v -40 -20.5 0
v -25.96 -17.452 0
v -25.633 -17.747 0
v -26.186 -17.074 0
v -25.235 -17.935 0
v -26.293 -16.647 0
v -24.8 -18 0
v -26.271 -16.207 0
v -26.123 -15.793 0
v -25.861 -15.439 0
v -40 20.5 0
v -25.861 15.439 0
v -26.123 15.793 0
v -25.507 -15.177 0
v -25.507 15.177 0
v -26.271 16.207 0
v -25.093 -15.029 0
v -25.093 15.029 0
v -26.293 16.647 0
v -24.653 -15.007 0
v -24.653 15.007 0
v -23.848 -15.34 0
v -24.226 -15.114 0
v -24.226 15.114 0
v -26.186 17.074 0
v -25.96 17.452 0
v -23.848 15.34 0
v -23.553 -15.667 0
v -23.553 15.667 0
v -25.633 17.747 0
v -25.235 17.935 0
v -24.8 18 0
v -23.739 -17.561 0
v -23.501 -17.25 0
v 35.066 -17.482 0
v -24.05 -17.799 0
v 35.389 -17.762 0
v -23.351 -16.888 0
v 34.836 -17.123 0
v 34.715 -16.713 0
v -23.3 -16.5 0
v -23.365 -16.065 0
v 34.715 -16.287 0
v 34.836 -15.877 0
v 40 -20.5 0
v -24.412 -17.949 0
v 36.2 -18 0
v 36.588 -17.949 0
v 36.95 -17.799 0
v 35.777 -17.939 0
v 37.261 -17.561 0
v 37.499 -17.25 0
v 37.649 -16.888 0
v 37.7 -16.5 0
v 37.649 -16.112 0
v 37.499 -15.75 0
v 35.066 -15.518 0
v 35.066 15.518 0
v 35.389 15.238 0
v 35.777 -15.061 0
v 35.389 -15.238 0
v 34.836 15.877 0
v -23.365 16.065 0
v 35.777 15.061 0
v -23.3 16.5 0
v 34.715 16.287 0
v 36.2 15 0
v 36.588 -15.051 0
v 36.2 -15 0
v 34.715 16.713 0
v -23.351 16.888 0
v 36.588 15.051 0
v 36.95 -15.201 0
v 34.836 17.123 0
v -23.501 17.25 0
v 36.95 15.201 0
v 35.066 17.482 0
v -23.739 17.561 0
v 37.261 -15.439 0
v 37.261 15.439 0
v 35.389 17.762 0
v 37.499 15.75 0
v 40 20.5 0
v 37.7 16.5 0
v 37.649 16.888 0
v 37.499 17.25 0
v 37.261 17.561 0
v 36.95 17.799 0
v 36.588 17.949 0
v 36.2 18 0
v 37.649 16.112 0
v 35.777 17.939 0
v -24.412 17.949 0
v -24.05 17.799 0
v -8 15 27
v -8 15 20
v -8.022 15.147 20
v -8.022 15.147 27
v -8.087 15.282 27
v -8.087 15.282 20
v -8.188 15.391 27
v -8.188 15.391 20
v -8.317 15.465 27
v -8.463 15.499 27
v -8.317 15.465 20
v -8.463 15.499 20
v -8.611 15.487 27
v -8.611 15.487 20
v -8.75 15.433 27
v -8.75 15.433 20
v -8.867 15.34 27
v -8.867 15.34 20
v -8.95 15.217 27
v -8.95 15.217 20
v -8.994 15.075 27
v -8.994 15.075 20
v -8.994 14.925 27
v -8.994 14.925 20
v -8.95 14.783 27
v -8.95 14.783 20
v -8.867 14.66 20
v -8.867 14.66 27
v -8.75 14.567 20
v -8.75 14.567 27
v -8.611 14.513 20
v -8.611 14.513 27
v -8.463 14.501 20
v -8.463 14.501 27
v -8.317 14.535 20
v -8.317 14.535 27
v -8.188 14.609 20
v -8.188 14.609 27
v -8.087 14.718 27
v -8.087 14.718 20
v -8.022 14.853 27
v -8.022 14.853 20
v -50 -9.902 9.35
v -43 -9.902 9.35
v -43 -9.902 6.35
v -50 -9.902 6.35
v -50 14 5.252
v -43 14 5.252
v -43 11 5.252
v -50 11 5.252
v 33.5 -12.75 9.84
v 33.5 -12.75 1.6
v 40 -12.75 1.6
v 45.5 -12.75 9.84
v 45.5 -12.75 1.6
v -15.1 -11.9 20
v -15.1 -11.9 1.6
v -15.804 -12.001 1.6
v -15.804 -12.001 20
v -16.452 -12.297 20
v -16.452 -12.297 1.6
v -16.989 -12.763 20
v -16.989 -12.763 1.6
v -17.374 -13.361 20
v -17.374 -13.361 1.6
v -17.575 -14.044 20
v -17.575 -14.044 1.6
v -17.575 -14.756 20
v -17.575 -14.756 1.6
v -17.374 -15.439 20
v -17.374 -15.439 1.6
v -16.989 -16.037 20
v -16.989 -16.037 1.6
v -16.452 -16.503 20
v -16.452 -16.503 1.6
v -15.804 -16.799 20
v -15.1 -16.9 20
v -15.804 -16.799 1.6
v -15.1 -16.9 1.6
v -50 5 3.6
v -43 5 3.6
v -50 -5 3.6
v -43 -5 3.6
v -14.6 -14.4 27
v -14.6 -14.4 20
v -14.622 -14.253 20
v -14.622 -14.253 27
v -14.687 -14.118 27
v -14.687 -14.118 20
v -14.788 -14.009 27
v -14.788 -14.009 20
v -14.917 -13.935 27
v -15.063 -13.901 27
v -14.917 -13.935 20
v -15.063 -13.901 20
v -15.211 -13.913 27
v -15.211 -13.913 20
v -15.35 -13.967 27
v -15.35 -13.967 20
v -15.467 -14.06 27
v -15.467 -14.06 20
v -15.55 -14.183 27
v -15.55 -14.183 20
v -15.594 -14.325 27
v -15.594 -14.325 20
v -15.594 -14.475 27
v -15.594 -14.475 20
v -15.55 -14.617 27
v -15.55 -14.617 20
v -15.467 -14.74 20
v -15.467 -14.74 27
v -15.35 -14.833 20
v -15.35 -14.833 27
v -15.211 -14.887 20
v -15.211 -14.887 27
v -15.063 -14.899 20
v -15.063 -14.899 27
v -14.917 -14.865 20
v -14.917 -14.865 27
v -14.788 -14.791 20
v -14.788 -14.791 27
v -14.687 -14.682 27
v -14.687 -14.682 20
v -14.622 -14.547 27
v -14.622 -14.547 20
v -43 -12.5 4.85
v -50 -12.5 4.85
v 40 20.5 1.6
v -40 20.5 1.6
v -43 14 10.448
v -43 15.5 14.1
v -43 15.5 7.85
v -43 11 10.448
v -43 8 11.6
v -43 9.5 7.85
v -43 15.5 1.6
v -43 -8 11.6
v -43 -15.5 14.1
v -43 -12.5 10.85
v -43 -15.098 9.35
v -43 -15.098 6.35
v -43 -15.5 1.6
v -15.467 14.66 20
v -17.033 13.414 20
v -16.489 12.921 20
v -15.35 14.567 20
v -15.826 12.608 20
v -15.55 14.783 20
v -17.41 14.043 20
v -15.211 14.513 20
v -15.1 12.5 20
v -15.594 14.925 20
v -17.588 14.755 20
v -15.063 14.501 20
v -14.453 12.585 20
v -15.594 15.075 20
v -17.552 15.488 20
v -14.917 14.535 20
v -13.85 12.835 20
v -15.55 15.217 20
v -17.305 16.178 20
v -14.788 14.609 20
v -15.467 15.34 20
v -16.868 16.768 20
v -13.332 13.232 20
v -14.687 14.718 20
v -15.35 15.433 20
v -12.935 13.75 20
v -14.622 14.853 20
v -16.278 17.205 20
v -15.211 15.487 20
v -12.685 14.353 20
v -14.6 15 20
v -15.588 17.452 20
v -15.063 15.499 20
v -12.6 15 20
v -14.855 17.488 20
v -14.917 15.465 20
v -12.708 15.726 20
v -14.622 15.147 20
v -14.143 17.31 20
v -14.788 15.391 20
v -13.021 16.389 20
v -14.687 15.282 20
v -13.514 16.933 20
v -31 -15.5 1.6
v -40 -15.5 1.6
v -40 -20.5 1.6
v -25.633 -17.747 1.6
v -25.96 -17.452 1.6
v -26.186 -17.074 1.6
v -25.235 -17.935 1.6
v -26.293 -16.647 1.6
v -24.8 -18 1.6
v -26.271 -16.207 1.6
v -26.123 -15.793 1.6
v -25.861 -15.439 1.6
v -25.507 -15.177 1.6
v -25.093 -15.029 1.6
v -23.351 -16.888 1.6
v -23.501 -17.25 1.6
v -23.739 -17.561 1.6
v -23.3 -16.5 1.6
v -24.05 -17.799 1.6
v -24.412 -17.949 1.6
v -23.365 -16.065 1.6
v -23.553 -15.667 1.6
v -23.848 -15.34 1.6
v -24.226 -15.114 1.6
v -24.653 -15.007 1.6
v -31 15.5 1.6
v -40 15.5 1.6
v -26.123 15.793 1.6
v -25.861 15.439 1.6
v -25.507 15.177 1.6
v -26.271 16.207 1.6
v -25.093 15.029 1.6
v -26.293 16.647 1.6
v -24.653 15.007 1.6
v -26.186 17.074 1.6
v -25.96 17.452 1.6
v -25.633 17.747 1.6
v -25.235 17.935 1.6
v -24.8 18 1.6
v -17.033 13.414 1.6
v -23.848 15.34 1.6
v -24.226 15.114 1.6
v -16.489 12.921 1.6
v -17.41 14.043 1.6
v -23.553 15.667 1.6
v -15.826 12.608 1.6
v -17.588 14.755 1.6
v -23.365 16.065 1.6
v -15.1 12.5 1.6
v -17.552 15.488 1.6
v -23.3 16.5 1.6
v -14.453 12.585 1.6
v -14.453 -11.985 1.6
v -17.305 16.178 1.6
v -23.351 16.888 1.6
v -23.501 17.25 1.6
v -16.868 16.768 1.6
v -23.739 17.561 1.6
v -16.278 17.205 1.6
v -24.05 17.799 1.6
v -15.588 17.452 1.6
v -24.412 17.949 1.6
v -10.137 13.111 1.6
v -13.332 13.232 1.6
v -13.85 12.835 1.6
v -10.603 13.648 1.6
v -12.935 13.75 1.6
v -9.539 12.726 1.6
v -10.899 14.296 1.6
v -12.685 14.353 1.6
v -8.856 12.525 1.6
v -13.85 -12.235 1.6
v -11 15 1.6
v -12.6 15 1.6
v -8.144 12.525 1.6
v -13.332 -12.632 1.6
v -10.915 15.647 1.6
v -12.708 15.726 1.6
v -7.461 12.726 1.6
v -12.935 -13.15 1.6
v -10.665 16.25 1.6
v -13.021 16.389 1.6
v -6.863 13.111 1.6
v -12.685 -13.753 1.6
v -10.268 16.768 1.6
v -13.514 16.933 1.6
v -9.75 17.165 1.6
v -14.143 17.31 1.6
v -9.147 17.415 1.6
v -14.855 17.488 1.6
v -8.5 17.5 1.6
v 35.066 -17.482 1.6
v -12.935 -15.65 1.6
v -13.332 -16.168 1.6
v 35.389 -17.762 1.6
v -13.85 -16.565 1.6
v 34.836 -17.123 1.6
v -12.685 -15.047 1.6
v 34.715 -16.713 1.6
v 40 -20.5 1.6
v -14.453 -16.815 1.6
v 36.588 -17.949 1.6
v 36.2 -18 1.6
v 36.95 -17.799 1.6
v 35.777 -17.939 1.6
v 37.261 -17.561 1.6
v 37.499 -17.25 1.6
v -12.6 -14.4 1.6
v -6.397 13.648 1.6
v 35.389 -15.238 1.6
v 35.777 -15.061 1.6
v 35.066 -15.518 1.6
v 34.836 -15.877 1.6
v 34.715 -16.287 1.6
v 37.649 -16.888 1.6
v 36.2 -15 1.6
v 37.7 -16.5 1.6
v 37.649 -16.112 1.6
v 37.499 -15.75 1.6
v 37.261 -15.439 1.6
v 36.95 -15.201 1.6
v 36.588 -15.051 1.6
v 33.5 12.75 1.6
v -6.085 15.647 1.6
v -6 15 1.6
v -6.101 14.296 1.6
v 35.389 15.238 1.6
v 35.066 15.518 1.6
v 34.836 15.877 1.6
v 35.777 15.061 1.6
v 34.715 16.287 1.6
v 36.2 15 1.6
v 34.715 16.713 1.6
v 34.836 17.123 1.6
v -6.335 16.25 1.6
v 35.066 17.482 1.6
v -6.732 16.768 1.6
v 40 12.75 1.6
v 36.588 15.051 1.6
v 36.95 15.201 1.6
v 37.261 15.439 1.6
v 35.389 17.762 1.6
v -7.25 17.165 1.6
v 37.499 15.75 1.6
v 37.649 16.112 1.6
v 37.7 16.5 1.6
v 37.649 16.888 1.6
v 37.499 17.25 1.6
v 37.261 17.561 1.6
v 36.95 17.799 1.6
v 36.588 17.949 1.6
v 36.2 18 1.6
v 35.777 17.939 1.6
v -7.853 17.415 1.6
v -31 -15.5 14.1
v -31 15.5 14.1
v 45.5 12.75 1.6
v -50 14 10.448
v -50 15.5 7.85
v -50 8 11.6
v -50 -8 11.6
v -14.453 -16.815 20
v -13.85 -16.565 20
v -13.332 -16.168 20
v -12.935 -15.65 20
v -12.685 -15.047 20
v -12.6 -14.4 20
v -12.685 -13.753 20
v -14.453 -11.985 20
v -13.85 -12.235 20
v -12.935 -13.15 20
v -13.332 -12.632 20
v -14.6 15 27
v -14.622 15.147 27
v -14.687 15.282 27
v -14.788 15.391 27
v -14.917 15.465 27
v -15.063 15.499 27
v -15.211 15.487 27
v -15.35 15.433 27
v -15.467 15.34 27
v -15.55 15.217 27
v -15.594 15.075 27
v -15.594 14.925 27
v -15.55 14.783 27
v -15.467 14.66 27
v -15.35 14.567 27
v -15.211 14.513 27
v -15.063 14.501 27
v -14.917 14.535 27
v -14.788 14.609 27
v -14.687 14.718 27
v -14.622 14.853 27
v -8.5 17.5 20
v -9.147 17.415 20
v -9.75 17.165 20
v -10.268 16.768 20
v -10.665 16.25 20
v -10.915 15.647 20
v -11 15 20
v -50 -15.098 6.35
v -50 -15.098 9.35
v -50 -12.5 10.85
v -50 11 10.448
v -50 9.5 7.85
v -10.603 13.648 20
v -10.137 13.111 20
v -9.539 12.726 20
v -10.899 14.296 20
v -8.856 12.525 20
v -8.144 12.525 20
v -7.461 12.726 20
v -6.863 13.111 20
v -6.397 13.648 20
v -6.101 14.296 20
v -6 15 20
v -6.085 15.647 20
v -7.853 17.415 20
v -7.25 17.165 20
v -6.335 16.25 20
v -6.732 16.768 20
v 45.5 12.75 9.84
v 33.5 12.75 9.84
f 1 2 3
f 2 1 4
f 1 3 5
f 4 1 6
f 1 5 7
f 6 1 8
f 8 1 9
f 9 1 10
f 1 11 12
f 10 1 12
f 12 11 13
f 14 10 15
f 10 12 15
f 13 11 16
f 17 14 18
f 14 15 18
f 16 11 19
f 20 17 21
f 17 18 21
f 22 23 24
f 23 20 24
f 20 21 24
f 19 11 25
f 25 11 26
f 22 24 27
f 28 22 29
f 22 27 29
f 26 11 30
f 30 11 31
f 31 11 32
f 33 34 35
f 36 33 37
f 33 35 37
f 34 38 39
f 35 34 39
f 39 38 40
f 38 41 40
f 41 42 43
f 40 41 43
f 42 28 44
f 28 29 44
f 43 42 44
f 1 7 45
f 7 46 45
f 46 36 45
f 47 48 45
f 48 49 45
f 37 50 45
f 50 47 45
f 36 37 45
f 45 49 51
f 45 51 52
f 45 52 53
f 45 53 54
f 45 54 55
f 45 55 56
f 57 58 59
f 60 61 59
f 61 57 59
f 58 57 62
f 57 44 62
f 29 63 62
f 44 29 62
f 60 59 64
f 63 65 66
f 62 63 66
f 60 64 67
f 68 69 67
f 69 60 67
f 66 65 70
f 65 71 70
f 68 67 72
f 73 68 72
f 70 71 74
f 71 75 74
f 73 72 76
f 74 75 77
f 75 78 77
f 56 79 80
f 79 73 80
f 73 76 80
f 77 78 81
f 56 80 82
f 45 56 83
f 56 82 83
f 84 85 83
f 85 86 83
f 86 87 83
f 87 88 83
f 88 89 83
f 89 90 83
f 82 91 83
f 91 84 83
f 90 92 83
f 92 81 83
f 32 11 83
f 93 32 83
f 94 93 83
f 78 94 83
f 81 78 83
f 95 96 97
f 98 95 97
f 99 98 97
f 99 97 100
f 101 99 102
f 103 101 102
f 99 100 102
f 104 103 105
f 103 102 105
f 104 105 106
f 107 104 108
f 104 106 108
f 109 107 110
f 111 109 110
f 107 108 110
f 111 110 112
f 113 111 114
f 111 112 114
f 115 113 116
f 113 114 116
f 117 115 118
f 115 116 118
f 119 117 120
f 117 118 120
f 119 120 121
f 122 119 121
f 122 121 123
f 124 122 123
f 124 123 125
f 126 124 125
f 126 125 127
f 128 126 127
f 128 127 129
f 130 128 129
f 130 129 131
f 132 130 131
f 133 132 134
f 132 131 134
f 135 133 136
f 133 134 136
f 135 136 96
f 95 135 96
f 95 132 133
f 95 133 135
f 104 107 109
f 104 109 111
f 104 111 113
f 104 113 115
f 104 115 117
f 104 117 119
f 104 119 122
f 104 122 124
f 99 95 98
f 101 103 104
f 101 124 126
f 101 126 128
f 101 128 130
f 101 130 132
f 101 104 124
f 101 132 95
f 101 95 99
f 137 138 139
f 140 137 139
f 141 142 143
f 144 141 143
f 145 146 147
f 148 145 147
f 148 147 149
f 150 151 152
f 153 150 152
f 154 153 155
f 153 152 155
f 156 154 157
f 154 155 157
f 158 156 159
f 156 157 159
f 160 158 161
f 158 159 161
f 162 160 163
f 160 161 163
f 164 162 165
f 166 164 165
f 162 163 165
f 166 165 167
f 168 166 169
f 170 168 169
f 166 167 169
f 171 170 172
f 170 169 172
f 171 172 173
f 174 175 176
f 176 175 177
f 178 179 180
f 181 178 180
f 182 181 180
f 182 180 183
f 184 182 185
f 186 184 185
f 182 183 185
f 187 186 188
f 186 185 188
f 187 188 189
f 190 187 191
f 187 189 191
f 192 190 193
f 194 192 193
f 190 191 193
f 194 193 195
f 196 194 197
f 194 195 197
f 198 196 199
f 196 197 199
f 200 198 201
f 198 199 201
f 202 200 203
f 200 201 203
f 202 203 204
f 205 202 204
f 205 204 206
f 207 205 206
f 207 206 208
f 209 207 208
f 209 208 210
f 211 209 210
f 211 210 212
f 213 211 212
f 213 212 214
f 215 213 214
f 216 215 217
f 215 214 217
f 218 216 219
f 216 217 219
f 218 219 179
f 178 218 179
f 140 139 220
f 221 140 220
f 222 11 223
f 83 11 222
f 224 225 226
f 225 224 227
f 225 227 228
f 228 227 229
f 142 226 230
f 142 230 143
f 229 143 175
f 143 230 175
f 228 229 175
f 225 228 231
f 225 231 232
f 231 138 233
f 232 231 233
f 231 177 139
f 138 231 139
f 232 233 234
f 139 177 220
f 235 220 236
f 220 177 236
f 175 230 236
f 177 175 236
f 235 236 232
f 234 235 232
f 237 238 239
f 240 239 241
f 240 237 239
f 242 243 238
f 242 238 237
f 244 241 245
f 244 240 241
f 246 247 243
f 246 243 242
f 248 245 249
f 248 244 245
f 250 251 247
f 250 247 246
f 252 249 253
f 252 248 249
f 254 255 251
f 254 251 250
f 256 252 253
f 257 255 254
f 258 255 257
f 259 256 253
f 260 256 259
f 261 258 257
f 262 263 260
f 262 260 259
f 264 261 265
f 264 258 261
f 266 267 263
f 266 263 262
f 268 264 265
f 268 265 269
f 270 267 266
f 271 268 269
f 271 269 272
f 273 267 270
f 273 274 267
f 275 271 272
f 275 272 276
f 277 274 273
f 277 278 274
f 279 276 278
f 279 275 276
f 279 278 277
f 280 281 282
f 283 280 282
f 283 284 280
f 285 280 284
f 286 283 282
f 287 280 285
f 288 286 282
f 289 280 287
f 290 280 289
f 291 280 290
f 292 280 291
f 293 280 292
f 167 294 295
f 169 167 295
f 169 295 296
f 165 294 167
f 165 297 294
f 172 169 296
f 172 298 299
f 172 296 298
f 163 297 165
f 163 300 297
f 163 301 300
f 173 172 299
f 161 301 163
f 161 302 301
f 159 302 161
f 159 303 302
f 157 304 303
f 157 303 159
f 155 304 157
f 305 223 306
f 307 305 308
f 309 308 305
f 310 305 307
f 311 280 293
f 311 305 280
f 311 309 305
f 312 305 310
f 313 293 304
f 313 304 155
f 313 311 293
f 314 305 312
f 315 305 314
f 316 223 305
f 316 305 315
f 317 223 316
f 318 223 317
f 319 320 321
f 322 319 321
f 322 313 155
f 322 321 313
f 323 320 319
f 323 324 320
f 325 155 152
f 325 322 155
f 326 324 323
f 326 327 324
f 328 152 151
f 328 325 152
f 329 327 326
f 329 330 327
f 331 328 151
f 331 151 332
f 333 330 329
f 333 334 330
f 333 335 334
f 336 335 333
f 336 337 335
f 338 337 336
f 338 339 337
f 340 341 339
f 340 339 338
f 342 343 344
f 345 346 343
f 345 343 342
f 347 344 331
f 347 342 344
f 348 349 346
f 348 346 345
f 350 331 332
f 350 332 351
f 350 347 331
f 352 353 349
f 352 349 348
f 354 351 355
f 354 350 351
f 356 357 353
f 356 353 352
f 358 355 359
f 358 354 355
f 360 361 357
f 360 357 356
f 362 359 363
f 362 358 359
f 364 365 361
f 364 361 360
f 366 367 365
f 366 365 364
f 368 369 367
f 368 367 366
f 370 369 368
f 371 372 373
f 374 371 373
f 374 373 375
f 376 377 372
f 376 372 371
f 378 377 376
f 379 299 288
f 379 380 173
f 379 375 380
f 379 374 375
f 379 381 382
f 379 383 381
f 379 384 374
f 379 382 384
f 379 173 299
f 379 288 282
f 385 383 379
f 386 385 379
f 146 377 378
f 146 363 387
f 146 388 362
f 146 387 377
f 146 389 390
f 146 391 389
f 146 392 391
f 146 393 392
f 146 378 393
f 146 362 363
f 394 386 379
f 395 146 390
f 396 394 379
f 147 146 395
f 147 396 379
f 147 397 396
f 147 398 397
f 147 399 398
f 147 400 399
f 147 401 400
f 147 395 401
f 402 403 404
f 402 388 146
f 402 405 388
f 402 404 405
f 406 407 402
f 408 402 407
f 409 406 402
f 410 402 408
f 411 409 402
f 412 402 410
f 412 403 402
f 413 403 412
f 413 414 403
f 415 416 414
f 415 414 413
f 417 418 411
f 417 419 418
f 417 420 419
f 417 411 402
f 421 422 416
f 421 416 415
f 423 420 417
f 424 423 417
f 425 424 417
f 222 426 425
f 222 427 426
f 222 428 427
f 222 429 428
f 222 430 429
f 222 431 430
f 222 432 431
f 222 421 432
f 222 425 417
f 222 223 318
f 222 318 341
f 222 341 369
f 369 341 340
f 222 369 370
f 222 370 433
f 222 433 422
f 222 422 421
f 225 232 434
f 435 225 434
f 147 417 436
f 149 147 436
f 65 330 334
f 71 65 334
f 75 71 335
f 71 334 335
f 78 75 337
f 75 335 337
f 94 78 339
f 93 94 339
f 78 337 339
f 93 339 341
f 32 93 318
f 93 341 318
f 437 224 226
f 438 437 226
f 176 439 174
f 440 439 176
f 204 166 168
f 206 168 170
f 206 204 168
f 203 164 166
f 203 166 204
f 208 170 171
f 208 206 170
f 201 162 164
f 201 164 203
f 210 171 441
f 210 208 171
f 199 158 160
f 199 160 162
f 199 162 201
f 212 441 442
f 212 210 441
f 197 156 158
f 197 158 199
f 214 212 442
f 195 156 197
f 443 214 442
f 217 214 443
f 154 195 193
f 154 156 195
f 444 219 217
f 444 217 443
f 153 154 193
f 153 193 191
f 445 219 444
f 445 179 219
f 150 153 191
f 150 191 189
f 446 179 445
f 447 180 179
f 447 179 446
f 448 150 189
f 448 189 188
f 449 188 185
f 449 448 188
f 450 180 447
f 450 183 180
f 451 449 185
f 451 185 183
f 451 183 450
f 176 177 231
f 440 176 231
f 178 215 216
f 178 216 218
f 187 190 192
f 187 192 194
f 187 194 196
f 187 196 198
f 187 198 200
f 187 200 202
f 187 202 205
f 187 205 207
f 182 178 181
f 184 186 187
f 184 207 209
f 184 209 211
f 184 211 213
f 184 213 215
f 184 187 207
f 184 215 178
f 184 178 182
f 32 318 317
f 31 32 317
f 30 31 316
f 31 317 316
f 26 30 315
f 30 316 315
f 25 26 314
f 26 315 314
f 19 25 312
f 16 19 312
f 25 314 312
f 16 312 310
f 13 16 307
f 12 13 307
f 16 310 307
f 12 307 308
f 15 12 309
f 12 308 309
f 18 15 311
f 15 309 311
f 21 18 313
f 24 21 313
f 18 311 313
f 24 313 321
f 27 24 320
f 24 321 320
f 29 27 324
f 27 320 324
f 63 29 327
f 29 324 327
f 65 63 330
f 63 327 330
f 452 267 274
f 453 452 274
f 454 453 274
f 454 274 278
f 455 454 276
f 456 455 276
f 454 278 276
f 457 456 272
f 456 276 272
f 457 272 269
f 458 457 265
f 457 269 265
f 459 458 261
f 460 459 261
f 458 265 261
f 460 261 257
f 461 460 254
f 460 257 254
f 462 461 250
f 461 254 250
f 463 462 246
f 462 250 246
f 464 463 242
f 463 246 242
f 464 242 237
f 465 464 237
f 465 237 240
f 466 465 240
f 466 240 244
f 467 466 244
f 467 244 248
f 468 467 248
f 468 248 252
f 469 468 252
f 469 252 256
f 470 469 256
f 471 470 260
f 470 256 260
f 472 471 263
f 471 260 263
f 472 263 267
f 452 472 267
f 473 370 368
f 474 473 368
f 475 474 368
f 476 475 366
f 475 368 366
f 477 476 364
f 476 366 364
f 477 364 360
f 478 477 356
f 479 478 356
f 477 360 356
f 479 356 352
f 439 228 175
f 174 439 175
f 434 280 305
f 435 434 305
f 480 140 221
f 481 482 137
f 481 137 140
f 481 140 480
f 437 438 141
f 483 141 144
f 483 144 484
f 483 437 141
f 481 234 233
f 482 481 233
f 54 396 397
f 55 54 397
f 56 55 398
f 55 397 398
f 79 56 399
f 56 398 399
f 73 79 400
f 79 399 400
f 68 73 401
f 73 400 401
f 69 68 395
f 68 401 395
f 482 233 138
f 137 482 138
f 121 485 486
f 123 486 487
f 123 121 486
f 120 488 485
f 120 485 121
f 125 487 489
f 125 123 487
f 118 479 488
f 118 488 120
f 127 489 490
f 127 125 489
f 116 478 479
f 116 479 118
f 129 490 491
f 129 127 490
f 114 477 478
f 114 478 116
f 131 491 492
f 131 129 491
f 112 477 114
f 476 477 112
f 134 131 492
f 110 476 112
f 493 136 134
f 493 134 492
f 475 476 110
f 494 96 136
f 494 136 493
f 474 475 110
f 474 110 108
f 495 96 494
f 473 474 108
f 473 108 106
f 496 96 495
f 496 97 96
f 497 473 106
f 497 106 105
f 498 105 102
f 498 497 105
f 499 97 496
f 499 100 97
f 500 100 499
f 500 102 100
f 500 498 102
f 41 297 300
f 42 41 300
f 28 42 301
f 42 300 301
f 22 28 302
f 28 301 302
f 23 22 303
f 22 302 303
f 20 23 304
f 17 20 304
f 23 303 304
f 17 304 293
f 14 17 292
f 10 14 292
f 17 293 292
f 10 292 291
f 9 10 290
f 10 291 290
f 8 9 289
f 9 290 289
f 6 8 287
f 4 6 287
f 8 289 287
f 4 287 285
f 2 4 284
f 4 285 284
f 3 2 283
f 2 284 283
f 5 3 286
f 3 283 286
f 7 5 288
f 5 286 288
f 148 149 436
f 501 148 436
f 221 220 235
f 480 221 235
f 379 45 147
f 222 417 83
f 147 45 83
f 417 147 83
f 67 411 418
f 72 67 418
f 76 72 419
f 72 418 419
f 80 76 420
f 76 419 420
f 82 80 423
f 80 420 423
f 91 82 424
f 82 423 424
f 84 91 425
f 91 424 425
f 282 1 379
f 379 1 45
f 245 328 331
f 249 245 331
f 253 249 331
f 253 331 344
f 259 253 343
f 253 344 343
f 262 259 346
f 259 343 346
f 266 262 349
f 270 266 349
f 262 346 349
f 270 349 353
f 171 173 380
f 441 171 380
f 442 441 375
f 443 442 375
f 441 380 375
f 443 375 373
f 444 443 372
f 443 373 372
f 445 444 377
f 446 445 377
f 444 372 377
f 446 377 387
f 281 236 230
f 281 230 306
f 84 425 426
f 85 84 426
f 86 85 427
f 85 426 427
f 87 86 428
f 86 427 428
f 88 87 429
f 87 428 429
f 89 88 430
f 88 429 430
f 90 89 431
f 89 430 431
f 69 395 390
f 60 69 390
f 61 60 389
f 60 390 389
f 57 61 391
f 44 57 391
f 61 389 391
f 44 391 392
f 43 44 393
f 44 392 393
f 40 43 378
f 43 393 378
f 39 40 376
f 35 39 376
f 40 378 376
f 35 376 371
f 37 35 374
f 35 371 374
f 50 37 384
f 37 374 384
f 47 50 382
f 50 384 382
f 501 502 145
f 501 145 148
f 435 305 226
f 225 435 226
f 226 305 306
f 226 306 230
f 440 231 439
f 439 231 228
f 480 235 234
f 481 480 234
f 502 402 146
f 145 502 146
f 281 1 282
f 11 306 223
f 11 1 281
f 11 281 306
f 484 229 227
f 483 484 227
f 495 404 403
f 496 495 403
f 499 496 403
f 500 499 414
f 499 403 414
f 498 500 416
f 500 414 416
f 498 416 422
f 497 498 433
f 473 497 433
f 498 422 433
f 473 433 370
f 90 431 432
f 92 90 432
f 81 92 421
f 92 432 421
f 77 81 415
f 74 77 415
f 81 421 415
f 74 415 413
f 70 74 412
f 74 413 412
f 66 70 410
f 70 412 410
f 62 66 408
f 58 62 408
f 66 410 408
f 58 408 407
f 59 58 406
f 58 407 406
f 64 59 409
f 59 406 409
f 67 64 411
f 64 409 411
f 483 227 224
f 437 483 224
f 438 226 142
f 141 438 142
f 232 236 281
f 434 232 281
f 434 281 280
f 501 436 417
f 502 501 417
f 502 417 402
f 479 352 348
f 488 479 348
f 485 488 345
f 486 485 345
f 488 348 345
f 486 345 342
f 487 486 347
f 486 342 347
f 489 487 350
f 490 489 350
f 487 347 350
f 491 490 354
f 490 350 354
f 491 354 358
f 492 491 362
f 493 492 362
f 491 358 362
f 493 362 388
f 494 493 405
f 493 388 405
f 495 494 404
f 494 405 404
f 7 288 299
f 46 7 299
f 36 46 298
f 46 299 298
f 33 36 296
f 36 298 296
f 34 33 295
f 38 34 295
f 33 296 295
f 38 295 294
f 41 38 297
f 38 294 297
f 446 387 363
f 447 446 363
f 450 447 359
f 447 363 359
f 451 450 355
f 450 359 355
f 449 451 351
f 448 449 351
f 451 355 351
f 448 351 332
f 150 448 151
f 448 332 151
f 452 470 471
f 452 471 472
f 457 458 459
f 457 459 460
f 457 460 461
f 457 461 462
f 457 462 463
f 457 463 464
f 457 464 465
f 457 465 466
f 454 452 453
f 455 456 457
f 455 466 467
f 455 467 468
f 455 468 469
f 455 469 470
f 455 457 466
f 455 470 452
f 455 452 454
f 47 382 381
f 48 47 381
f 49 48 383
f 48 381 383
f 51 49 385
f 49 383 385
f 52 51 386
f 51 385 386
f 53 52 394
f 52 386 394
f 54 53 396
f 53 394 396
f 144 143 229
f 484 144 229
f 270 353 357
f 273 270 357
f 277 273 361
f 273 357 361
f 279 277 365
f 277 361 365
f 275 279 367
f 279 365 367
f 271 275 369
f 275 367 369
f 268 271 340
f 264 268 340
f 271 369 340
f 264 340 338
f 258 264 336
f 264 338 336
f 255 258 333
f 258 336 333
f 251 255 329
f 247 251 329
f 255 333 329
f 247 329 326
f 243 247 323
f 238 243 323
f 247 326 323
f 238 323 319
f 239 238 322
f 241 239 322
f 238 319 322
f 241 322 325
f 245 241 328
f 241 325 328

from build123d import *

# Parameters (mm, degrees)
F0_W      = 80
F0_H      = 41
F1_DEPTH  = 1.6
F3_DEPTH  = 8.24
F5_DEPTH  = 12.5
F7_DEPTH  = 7
F9_DEPTH  = 2
F11_DEPTH = 18.4
F12_R     = 0.5
F13_DEPTH = 7
F14_R     = 0.5
F15_DEPTH = 7
F16_R     = 0.5
F17_DEPTH = 7


with BuildPart() as f1:
    # F0 (on Top) → F1 (new body)
    with BuildSketch(Plane.XY):
        Rectangle(F0_W, F0_H)
    extrude(amount=F1_DEPTH)

    # F2 (on face) → F3 (join)
    with BuildSketch(Plane.XY.offset(1.6)):
        Polygon((40, -12.75), (40, 0), (40, 12.75), (33.5, 12.75), (33.5, -12.75), align=None)
        Polygon((40, 12.75), (40, 0), (40, -12.75), (45.5, -12.75), (45.5, 12.75), align=None)
    extrude(amount=F3_DEPTH)

    # F4 (on face) → F5 (join)
    with BuildSketch(Plane.XY.offset(1.6)):
        Polygon((-40, -15.5), (-40, 0), (-40, 15.5), (-43, 15.5), (-43, -15.5), align=None)
        Polygon((-40, 15.5), (-40, 0), (-40, -15.5), (-31, -15.5), (-31, 15.5), align=None)
    extrude(amount=F5_DEPTH)

    # F6 (on face) → F7 (join)
    with BuildSketch(Plane(origin=(-43, 0, 0), x_dir=(0, -1, 0), z_dir=(-1, 0, 0))):
        Polygon((0, 11.6), (0, 3.6), (5, 3.6), (8, 11.6), align=None)
        Polygon((-5, 3.6), (0, 3.6), (0, 11.6), (-8, 11.6), align=None)
        Polygon((-14, 10.448076), (-15.5, 7.85), (-14, 5.251924), (-11, 5.251924), (-9.5, 7.85), (-11, 10.448076), align=None)
        Polygon((15.098076, 9.35), (12.5, 10.85), (9.901924, 9.35), (9.901924, 6.35), (12.5, 4.85), (15.098076, 6.35), (15.098076, 7.85), align=None)
    extrude(amount=F7_DEPTH)

    # F8 (on face) → F9 (cut)
    with BuildSketch(Plane.XY.offset(1.6)):
        with BuildLine():
            ThreePointArc((37.7, 16.5), (37.26066, 17.56066), (36.2, 18))
            Line((36.2, 18), (36.2, 16.5))
            Line((36.2, 16.5), (36.2, 15))
            ThreePointArc((36.2, 15), (37.26066, 15.43934), (37.7, 16.5))
        make_face()
        with BuildLine():
            ThreePointArc((-23.3, -16.5), (-25.86066, -15.43934), (-24.8, -18))
            ThreePointArc((-24.8, -18), (-23.73934, -17.56066), (-23.3, -16.5))
        make_face()
        with BuildLine():
            ThreePointArc((37.7, -16.5), (37.26066, -15.43934), (36.2, -15))
            Line((36.2, -15), (36.2, -16.5))
            Line((36.2, -16.5), (36.2, -18))
            ThreePointArc((36.2, -18), (37.26066, -17.56066), (37.7, -16.5))
        make_face()
        with BuildLine():
            Line((36.2, -16.5), (36.2, -15))
            ThreePointArc((36.2, -15), (34.7, -16.5), (36.2, -18))
            Line((36.2, -18), (36.2, -16.5))
        make_face()
        with BuildLine():
            Line((36.2, 16.5), (36.2, 18))
            ThreePointArc((36.2, 18), (34.7, 16.5), (36.2, 15))
            Line((36.2, 15), (36.2, 16.5))
        make_face()
        with BuildLine():
            ThreePointArc((-24.8, 18), (-25.86066, 15.43934), (-23.3, 16.5))
            ThreePointArc((-23.3, 16.5), (-23.73934, 17.56066), (-24.8, 18))
        make_face()
    extrude(amount=-F9_DEPTH, mode=Mode.SUBTRACT)

    # F10 (on face) → F11 (join)
    with BuildSketch(Plane.XY.offset(1.6)):
        with BuildLine():
            ThreePointArc((-6, 15), (-6.732233, 16.767767), (-8.5, 17.5))
            Line((-8.5, 17.5), (-8.5, 15))
            Line((-8.5, 15), (-11, 15))
            ThreePointArc((-11, 15), (-8.5, 12.5), (-6, 15))
        make_face()
        with BuildLine():
            ThreePointArc((-12.6, -14.4), (-13.332233, -12.632233), (-15.1, -11.9))
            Line((-15.1, -11.9), (-15.1, -14.4))
            Line((-15.1, -14.4), (-15.1, -16.9))
            ThreePointArc((-15.1, -16.9), (-13.332233, -16.167767), (-12.6, -14.4))
        make_face()
        with BuildLine():
            Line((-15.1, -14.4), (-15.1, -11.9))
            ThreePointArc((-15.1, -11.9), (-17.6, -14.4), (-15.1, -16.9))
            Line((-15.1, -16.9), (-15.1, -14.4))
        make_face()
        with BuildLine():
            ThreePointArc((-15.1, 12.5), (-13.332233, 13.232233), (-12.6, 15))
            Line((-12.6, 15), (-15.1, 15))
            Line((-15.1, 15), (-15.1, 12.5))
        make_face()
        with BuildLine():
            Line((-15.1, 15), (-12.6, 15))
            ThreePointArc((-12.6, 15), (-16.867767, 16.767767), (-15.1, 12.5))
            Line((-15.1, 12.5), (-15.1, 15))
        make_face()
        with BuildLine():
            Line((-8.5, 15), (-8.5, 17.5))
            ThreePointArc((-8.5, 17.5), (-10.267767, 16.767767), (-11, 15))
            Line((-11, 15), (-8.5, 15))
        make_face()
    extrude(amount=F11_DEPTH)

    # F12 (on face) → F13 (join)
    with BuildSketch(Plane.XY.offset(20)):
        with Locations((-15.1, 15)):
            Circle(F12_R)
    extrude(amount=F13_DEPTH)

    # F14 (on face) → F15 (join)
    with BuildSketch(Plane.XY.offset(20)):
        with Locations((-8.5, 15)):
            Circle(F14_R)
    extrude(amount=F15_DEPTH)

    # F16 (on face) → F17 (join)
    with BuildSketch(Plane.XY.offset(20)):
        with Locations((-15.1, -14.4)):
            Circle(F16_R)
    extrude(amount=F17_DEPTH)


solid = f1.part
